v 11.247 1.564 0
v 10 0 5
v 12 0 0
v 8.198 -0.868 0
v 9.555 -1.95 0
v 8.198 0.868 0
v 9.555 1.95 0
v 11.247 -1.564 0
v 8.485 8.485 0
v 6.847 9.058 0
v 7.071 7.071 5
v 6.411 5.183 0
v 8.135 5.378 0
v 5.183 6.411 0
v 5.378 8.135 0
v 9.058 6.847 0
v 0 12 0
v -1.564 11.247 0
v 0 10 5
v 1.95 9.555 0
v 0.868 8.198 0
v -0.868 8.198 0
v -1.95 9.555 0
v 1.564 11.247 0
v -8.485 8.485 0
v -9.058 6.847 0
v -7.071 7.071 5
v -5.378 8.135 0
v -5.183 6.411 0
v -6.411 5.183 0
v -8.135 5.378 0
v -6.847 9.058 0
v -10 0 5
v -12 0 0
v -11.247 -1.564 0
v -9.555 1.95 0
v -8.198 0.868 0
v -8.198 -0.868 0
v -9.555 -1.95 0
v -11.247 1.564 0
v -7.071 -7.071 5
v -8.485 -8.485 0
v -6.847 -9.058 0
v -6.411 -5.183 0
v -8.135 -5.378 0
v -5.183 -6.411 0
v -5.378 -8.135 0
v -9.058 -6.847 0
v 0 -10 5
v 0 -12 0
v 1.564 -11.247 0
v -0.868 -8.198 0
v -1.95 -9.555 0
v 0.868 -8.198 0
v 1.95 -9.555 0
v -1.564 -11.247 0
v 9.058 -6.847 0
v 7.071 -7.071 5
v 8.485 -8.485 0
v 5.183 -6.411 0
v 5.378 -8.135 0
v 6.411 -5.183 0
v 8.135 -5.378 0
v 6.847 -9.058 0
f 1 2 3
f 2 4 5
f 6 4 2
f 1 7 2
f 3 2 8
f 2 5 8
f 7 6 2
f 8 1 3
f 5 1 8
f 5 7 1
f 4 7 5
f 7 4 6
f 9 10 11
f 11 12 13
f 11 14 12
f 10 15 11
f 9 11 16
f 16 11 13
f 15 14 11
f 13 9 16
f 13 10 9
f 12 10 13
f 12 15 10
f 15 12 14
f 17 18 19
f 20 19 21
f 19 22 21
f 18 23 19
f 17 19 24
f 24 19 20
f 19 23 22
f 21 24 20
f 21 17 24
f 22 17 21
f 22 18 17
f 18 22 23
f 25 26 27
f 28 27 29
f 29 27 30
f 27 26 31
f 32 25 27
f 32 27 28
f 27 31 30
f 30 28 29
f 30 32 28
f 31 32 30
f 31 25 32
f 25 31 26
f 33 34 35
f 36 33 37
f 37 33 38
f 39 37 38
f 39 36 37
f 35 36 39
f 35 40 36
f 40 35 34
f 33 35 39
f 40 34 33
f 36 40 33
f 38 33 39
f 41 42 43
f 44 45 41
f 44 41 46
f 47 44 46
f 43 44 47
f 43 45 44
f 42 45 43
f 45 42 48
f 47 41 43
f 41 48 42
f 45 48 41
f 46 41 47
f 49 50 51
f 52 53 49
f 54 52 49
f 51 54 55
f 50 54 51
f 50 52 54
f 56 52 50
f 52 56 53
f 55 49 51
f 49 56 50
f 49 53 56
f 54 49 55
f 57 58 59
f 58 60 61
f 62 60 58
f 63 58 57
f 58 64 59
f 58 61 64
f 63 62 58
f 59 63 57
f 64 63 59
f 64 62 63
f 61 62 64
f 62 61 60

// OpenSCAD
for(theta=[0:45:315])
	rotate([0, 0, theta])
		translate([10, 0, 0]) cylinder(h=5, r1=2, r2=0);
